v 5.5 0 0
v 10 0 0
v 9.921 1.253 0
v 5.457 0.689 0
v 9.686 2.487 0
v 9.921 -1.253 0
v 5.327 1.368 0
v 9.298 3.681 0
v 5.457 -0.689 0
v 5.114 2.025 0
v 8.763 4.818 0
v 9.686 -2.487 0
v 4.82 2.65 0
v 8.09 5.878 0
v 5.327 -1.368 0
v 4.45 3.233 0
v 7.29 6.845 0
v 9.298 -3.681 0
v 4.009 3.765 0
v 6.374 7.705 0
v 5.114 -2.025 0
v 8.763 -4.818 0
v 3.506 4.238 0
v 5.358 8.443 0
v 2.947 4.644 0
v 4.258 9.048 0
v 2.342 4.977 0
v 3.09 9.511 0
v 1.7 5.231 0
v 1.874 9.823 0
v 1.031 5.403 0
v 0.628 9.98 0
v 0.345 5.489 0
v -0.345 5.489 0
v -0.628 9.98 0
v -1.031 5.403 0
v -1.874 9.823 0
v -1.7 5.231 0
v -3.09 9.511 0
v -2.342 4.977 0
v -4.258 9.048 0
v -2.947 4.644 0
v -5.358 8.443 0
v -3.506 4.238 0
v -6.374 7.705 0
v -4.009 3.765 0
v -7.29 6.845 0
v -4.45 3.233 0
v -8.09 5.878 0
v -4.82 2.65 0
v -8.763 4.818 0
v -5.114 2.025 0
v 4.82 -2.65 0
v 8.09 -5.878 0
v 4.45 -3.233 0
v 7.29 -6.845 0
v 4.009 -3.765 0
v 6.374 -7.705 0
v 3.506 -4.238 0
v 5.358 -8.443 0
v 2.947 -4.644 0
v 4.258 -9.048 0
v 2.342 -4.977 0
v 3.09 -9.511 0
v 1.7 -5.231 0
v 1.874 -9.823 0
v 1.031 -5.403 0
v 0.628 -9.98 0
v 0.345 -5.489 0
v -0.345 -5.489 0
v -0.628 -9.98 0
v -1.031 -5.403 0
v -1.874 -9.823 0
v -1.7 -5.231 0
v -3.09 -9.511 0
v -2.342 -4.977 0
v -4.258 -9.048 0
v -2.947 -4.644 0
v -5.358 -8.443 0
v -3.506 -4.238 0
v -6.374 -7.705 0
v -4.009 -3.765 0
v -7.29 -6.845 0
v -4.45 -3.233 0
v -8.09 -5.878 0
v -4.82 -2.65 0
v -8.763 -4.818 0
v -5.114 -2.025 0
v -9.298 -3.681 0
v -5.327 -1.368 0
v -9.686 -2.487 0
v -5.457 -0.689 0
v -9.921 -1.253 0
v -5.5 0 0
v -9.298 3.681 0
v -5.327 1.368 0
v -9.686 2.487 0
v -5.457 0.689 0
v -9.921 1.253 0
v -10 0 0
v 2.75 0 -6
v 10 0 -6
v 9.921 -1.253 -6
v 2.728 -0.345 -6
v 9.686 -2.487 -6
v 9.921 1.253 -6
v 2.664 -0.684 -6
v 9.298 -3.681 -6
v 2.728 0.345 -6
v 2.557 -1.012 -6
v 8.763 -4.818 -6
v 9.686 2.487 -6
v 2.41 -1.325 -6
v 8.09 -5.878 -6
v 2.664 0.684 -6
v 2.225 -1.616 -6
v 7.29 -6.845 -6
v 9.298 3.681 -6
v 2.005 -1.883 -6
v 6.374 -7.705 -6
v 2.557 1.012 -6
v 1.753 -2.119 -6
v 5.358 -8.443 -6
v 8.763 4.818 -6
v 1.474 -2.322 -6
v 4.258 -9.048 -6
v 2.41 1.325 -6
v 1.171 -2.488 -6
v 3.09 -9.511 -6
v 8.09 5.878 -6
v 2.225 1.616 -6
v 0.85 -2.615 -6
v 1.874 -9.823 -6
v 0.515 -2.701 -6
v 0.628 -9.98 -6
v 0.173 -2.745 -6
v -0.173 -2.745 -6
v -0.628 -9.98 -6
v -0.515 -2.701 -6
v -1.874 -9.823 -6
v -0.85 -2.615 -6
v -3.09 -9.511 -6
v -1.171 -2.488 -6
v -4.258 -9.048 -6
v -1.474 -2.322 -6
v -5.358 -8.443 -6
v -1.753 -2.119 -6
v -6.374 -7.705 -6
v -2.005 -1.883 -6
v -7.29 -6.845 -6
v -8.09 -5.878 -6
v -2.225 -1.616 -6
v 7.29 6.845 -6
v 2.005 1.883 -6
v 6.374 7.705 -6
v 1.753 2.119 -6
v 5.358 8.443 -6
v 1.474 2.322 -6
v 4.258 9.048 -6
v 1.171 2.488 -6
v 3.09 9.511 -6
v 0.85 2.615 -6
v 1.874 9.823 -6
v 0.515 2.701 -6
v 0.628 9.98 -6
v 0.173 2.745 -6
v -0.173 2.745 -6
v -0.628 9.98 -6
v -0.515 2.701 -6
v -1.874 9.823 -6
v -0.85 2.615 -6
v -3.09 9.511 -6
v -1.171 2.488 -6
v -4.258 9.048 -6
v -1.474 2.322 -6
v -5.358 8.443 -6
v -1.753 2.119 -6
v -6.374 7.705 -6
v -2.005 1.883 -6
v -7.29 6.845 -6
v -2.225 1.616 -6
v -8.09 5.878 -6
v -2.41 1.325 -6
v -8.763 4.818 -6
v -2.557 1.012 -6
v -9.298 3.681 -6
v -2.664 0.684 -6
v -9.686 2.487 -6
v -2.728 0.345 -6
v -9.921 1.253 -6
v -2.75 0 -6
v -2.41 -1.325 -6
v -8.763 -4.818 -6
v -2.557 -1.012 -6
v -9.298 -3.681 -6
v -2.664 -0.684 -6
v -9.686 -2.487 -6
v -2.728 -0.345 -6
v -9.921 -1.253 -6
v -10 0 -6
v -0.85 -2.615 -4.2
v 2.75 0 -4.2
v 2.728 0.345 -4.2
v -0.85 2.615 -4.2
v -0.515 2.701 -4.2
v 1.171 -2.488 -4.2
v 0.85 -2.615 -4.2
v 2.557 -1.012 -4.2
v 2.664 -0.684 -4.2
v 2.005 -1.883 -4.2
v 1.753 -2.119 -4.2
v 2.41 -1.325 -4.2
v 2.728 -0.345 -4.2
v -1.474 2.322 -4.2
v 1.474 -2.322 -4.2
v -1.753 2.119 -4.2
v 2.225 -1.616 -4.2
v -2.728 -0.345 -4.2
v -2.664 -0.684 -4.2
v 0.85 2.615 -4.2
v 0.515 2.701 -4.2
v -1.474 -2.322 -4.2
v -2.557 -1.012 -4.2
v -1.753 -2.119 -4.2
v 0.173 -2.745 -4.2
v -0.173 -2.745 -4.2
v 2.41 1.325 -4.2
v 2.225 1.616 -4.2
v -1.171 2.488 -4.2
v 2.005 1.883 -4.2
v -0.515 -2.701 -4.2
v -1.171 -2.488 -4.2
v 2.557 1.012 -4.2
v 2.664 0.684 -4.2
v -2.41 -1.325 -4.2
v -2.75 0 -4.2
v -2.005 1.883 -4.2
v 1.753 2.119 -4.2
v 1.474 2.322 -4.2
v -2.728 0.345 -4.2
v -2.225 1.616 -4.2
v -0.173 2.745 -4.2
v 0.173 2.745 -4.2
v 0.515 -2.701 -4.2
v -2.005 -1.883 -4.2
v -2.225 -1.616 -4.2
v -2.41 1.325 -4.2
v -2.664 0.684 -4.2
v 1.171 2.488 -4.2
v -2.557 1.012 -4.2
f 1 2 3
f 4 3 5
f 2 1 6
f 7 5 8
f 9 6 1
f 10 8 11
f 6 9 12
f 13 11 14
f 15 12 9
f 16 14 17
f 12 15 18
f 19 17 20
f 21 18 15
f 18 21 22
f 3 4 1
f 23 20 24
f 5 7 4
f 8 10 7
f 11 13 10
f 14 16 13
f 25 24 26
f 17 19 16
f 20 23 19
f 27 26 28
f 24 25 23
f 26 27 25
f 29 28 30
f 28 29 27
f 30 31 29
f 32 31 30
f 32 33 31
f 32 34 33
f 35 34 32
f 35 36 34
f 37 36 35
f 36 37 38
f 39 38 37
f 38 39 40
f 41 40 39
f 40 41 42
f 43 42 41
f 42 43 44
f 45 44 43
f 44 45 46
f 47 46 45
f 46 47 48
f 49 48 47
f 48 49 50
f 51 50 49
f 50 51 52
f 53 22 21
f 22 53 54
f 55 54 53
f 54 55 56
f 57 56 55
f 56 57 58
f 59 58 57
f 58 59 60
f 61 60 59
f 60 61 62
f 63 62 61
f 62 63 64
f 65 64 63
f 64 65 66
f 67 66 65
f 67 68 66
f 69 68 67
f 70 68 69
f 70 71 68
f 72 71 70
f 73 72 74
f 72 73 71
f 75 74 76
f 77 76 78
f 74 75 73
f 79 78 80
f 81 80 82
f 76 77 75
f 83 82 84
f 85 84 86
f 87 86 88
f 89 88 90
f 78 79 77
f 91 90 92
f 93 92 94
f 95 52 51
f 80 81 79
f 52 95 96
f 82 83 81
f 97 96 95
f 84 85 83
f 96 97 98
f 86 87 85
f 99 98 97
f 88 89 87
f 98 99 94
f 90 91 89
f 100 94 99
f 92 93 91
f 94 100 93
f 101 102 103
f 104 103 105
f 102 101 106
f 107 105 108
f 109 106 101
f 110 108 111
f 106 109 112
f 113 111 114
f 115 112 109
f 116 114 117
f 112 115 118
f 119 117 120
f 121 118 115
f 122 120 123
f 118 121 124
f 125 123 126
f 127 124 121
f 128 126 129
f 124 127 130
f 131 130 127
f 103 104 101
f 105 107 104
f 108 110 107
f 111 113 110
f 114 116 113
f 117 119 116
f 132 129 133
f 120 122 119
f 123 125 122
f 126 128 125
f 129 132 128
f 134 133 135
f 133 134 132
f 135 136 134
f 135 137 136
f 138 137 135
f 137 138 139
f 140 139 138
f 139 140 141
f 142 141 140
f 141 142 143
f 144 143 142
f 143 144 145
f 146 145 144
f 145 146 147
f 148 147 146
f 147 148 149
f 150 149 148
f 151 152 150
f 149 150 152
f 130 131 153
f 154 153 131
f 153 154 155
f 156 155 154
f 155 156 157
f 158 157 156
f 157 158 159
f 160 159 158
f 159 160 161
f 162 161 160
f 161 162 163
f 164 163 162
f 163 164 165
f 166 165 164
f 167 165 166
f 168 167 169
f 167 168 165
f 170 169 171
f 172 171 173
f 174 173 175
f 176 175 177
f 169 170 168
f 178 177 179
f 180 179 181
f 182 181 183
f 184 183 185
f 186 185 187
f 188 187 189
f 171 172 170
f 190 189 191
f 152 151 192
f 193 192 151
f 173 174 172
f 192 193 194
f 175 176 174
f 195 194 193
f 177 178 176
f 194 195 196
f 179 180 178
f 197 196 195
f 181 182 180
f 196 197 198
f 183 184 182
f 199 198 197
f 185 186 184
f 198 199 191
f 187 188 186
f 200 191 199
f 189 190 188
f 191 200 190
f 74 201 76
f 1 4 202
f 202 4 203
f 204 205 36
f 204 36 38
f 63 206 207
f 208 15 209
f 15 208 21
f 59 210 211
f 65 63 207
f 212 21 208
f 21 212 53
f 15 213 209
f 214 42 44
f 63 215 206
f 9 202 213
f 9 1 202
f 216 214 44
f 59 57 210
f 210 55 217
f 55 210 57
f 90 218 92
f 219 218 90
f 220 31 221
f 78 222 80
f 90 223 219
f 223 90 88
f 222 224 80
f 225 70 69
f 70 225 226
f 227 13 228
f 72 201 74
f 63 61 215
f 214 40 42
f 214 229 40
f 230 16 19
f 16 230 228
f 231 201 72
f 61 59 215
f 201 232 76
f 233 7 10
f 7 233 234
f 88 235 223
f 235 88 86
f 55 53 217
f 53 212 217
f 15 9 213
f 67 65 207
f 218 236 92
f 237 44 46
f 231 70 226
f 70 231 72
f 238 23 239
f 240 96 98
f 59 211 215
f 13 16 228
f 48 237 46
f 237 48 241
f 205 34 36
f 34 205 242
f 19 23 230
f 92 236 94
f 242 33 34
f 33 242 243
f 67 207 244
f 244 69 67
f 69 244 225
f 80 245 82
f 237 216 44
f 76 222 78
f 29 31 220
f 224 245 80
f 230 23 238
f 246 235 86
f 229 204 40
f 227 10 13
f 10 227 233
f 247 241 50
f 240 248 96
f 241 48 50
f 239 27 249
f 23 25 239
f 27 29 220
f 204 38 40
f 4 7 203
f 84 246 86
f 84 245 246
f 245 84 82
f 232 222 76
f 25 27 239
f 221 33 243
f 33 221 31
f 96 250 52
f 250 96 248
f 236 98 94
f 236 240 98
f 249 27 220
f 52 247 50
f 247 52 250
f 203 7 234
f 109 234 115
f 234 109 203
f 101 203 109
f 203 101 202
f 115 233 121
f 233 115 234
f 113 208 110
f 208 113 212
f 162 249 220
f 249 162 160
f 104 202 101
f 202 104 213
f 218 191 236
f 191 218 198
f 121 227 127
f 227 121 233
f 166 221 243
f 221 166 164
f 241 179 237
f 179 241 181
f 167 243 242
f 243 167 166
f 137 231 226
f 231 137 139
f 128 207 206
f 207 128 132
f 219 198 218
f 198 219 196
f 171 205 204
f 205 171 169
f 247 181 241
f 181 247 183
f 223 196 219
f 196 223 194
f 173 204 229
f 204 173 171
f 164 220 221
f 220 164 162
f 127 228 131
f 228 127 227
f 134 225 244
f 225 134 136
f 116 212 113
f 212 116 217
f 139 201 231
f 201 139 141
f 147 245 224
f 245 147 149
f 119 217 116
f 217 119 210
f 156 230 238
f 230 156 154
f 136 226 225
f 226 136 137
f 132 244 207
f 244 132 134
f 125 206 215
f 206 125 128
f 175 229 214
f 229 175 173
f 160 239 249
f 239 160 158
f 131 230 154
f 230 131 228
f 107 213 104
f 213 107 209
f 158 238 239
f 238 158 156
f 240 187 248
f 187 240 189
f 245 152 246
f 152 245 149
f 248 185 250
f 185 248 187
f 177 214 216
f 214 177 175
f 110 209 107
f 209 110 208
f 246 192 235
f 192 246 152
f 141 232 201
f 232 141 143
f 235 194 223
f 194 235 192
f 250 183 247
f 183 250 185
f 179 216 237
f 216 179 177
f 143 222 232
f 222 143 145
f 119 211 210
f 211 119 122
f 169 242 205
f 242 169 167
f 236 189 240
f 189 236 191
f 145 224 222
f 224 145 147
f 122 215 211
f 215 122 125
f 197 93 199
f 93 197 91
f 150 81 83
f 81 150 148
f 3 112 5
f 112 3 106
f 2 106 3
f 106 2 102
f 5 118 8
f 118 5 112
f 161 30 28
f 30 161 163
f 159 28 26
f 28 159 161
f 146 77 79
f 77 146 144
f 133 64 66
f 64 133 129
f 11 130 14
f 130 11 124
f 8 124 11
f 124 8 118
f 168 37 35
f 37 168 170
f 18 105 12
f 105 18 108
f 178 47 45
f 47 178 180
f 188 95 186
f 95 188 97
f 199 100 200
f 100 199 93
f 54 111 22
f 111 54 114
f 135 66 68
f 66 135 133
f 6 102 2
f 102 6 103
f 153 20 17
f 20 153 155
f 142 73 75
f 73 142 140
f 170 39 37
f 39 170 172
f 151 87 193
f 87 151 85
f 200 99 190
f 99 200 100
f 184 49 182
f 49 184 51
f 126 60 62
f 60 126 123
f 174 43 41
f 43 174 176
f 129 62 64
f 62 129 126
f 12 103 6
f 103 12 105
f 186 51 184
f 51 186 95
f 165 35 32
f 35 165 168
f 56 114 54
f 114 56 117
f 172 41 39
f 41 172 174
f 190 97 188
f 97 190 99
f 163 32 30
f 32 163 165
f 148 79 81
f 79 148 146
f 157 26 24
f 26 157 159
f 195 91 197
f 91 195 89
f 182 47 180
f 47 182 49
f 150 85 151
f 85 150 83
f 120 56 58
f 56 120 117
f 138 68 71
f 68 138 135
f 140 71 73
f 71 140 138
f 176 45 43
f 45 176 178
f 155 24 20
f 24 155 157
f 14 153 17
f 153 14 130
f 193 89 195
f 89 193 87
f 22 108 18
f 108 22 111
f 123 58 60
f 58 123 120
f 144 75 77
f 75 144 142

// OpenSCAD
$fn = 50;


difference() {
	union() {
		translate(v = [0, 0, -6.0000000000]) {
			cylinder(h = 6, r = 10.0000000000);
		}
		cylinder(h = 0, r = 13.0000000000);
	}
	union() {
		translate(v = [0, 0, 0]) {
			rotate(a = [0, 0, 0]) {
				difference() {
					union() {
						#translate(v = [0, 0, -6.0000000000]) {
							cylinder(h = 6, r = 2.2500000000);
						}
						#translate(v = [0, 0, -4.2000000000]) {
							cylinder(h = 4.2000000000, r1 = 2.7500000000, r2 = 5.5000000000);
						}
						#translate(v = [0, 0, -6.0000000000]) {
							cylinder(h = 6, r = 2.7500000000);
						}
						#translate(v = [0, 0, -6.0000000000]) {
							cylinder(h = 6, r = 2.2500000000);
						}
					}
					union();
				}
			}
		}
	}
}
